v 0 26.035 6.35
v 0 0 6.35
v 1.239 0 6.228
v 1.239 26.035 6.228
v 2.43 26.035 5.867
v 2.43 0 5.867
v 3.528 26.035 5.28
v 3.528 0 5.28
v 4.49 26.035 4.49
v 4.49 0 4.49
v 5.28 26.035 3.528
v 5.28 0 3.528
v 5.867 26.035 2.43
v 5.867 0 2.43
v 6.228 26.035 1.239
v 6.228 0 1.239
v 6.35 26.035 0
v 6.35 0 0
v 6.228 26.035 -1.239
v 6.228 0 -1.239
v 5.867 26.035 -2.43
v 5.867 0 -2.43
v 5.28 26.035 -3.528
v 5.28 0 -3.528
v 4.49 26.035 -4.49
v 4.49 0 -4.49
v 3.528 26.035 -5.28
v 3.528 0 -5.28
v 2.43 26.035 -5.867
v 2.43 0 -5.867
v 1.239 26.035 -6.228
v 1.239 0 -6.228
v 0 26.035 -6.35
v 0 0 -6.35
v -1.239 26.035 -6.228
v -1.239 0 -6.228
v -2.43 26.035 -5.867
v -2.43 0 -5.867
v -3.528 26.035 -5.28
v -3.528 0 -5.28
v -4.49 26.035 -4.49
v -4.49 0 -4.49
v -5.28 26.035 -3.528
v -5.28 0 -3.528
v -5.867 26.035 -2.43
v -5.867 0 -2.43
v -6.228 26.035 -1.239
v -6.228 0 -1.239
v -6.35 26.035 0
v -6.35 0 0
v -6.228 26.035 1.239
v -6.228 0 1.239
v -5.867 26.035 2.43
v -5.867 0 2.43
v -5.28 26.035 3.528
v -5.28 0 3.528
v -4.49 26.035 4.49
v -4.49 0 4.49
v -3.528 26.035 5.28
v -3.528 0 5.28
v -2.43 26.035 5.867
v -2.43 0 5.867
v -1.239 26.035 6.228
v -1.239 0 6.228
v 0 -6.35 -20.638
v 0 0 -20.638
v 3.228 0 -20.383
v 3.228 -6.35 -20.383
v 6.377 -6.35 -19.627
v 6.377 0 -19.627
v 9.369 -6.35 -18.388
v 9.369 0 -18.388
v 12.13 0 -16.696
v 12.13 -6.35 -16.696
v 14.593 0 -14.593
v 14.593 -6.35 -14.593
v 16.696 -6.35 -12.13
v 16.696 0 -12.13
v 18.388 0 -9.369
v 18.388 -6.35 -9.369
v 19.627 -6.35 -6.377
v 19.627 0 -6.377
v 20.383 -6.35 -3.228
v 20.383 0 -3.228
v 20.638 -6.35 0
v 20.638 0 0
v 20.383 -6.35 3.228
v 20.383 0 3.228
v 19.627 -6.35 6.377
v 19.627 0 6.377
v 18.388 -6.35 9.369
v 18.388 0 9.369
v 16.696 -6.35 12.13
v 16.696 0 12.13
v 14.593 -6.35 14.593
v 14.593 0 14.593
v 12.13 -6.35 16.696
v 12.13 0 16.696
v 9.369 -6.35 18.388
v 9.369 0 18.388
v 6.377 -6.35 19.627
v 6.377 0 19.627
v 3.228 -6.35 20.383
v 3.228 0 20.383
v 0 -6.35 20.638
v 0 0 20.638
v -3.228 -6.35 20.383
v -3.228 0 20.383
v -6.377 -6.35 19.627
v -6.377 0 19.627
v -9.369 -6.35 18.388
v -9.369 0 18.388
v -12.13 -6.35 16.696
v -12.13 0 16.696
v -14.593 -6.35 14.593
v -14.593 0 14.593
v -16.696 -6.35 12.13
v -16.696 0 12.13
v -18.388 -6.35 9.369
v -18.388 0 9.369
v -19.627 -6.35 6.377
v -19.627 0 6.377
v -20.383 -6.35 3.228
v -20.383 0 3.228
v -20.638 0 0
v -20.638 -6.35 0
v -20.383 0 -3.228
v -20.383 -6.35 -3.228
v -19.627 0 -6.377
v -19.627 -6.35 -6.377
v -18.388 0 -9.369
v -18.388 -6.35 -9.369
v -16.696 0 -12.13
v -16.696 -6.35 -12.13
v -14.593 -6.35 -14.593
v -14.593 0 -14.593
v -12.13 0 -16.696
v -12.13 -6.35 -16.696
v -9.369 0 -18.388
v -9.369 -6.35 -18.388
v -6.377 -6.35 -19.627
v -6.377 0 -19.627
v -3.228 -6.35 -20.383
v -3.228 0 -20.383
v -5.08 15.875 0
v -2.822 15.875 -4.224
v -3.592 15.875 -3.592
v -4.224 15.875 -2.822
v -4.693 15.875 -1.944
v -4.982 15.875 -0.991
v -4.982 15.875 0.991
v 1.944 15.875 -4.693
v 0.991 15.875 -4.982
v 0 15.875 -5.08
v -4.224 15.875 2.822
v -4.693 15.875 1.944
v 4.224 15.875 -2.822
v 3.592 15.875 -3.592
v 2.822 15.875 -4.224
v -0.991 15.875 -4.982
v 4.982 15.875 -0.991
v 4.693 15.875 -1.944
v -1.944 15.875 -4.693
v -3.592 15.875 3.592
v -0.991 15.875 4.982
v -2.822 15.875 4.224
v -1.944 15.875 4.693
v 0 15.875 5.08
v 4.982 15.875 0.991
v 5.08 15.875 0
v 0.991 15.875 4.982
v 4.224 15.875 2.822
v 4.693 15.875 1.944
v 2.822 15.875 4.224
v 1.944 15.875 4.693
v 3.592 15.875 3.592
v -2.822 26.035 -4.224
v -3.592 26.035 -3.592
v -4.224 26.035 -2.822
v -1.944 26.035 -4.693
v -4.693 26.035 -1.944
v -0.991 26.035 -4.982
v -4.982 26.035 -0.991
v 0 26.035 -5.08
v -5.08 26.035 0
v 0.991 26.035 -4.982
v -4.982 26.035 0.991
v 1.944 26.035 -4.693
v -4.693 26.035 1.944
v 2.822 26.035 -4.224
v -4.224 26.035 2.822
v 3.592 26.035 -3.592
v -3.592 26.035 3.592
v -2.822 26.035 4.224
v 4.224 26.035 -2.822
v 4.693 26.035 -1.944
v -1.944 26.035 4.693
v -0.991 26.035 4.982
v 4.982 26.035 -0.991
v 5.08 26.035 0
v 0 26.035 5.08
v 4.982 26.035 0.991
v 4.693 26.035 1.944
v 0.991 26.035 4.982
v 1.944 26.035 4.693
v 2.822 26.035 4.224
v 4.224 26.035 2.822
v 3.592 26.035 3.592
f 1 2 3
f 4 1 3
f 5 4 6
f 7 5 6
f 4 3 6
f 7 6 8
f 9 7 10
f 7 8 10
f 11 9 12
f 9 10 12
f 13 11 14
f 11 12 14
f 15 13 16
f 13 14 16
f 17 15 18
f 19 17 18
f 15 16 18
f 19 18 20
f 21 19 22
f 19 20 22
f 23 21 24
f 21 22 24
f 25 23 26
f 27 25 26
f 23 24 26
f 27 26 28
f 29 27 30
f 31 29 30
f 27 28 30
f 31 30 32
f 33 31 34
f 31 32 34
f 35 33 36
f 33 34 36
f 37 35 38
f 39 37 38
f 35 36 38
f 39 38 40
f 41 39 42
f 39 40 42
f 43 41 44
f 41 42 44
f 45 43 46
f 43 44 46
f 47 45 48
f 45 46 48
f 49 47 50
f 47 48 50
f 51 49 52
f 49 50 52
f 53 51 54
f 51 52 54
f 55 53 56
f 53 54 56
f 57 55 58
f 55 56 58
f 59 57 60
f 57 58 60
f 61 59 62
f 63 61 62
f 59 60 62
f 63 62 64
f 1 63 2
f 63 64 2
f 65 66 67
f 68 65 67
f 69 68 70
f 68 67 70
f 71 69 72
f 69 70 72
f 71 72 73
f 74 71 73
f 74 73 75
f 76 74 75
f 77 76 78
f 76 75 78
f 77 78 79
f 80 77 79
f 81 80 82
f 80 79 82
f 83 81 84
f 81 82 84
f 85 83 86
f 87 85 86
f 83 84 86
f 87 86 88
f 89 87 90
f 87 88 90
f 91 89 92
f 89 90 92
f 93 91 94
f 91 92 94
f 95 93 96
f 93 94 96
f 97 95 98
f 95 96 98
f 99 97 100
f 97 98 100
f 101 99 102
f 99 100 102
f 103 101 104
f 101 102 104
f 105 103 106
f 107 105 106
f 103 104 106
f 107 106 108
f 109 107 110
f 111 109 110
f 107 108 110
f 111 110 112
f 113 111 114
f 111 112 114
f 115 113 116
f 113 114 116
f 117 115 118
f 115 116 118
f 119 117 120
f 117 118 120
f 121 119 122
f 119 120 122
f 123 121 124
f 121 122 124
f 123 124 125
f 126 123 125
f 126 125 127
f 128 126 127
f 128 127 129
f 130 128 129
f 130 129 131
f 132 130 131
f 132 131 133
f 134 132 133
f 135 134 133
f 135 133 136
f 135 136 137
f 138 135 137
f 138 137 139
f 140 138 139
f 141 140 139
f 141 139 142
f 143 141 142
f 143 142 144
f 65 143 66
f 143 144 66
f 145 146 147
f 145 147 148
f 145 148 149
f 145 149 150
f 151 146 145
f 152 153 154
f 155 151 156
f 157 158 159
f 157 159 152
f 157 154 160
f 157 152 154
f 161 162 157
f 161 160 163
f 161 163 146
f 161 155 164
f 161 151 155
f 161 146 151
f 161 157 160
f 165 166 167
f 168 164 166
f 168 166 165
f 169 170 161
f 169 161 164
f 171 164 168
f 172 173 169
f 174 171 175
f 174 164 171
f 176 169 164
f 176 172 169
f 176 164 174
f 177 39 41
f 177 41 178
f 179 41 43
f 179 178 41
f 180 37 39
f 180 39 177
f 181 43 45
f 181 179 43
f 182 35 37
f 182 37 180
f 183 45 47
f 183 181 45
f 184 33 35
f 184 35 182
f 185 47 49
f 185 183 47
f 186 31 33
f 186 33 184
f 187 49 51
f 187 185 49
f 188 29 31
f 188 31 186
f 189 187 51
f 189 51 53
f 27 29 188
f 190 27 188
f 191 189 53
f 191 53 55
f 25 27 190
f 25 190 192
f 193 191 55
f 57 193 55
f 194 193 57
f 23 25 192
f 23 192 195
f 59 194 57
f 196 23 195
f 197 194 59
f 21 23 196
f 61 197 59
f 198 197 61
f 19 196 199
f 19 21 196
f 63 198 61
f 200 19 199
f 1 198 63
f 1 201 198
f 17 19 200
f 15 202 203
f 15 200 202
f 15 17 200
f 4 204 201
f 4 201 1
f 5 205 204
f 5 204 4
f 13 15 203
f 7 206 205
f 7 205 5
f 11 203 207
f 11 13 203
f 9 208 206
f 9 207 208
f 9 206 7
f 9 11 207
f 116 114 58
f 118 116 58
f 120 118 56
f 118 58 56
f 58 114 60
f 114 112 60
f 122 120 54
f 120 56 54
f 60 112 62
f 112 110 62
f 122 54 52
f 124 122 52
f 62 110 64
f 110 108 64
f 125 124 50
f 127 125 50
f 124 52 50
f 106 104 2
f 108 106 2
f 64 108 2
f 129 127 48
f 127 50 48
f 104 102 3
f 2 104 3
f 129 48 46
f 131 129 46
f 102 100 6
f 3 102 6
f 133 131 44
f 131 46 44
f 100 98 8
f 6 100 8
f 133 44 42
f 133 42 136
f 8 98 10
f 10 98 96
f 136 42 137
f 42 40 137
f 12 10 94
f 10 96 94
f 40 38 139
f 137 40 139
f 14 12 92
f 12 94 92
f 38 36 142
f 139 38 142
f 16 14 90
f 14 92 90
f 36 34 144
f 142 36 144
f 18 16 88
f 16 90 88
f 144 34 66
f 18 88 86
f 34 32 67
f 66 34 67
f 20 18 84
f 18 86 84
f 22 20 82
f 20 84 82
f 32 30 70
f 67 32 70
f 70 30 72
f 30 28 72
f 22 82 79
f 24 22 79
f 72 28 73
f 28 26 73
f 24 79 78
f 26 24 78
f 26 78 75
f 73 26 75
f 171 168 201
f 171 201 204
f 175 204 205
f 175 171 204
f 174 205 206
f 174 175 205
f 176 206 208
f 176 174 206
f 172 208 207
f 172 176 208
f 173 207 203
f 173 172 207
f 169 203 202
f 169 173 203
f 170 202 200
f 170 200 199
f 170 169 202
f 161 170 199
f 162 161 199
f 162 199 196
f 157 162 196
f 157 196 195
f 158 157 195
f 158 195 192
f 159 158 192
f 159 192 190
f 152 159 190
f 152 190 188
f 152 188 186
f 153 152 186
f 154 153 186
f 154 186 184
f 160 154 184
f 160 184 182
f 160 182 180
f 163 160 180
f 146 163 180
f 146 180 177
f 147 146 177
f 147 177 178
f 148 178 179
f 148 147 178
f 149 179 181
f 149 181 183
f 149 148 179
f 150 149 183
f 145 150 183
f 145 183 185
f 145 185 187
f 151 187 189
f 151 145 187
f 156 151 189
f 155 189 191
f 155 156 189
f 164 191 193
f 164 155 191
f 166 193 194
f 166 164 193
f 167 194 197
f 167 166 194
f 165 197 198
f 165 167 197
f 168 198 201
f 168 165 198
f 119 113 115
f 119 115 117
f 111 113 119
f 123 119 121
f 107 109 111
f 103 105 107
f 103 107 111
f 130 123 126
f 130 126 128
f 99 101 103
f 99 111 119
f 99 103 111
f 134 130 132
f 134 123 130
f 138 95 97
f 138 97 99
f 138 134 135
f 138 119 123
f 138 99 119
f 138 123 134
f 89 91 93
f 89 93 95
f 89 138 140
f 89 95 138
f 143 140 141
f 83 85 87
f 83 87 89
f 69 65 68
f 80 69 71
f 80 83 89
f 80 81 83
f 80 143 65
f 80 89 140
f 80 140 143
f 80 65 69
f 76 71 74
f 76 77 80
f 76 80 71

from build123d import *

# Parameters (mm, degrees)
SKETCH1_R           = 6.35
SKETCH1_R_2         = 5.08
BOSS_EXTRUDE1_DEPTH = 26.035
SKETCH2_R           = 20.6375
BOSS_EXTRUDE2_DEPTH = 6.35
SKETCH3_R           = 5.08
BOSS_EXTRUDE3_DEPTH = 15.875


with BuildPart() as part:
    # Sketch1 → Boss-Extrude1 (new body)
    with BuildSketch(Plane(origin=(0, 0, 0), x_dir=(1, 0, 0), z_dir=(0, 1, 0))):
        with Locations(Location((0, 0, 0), (0, 0, 270))):
            Circle(SKETCH1_R)
        with Locations(Location((0, 0, 0), (0, 0, 270))):
            Circle(SKETCH1_R_2, mode=Mode.SUBTRACT)
    extrude(amount=BOSS_EXTRUDE1_DEPTH)

    # Sketch2 → Boss-Extrude2 (add)
    with BuildSketch(Plane.XZ):
        with Locations(Location((0, 0, 0), (0, 0, 270))):
            Circle(SKETCH2_R)
    extrude(amount=BOSS_EXTRUDE2_DEPTH)

    # Sketch3 → Boss-Extrude3 (add)
    with BuildSketch(Plane(origin=(0, 0, 0), x_dir=(1, 0, 0), z_dir=(0, 1, 0))):
        with Locations(Location((0, 0, 0), (0, 0, 270))):
            Circle(SKETCH3_R)
    extrude(amount=BOSS_EXTRUDE3_DEPTH)


solid = part.part
